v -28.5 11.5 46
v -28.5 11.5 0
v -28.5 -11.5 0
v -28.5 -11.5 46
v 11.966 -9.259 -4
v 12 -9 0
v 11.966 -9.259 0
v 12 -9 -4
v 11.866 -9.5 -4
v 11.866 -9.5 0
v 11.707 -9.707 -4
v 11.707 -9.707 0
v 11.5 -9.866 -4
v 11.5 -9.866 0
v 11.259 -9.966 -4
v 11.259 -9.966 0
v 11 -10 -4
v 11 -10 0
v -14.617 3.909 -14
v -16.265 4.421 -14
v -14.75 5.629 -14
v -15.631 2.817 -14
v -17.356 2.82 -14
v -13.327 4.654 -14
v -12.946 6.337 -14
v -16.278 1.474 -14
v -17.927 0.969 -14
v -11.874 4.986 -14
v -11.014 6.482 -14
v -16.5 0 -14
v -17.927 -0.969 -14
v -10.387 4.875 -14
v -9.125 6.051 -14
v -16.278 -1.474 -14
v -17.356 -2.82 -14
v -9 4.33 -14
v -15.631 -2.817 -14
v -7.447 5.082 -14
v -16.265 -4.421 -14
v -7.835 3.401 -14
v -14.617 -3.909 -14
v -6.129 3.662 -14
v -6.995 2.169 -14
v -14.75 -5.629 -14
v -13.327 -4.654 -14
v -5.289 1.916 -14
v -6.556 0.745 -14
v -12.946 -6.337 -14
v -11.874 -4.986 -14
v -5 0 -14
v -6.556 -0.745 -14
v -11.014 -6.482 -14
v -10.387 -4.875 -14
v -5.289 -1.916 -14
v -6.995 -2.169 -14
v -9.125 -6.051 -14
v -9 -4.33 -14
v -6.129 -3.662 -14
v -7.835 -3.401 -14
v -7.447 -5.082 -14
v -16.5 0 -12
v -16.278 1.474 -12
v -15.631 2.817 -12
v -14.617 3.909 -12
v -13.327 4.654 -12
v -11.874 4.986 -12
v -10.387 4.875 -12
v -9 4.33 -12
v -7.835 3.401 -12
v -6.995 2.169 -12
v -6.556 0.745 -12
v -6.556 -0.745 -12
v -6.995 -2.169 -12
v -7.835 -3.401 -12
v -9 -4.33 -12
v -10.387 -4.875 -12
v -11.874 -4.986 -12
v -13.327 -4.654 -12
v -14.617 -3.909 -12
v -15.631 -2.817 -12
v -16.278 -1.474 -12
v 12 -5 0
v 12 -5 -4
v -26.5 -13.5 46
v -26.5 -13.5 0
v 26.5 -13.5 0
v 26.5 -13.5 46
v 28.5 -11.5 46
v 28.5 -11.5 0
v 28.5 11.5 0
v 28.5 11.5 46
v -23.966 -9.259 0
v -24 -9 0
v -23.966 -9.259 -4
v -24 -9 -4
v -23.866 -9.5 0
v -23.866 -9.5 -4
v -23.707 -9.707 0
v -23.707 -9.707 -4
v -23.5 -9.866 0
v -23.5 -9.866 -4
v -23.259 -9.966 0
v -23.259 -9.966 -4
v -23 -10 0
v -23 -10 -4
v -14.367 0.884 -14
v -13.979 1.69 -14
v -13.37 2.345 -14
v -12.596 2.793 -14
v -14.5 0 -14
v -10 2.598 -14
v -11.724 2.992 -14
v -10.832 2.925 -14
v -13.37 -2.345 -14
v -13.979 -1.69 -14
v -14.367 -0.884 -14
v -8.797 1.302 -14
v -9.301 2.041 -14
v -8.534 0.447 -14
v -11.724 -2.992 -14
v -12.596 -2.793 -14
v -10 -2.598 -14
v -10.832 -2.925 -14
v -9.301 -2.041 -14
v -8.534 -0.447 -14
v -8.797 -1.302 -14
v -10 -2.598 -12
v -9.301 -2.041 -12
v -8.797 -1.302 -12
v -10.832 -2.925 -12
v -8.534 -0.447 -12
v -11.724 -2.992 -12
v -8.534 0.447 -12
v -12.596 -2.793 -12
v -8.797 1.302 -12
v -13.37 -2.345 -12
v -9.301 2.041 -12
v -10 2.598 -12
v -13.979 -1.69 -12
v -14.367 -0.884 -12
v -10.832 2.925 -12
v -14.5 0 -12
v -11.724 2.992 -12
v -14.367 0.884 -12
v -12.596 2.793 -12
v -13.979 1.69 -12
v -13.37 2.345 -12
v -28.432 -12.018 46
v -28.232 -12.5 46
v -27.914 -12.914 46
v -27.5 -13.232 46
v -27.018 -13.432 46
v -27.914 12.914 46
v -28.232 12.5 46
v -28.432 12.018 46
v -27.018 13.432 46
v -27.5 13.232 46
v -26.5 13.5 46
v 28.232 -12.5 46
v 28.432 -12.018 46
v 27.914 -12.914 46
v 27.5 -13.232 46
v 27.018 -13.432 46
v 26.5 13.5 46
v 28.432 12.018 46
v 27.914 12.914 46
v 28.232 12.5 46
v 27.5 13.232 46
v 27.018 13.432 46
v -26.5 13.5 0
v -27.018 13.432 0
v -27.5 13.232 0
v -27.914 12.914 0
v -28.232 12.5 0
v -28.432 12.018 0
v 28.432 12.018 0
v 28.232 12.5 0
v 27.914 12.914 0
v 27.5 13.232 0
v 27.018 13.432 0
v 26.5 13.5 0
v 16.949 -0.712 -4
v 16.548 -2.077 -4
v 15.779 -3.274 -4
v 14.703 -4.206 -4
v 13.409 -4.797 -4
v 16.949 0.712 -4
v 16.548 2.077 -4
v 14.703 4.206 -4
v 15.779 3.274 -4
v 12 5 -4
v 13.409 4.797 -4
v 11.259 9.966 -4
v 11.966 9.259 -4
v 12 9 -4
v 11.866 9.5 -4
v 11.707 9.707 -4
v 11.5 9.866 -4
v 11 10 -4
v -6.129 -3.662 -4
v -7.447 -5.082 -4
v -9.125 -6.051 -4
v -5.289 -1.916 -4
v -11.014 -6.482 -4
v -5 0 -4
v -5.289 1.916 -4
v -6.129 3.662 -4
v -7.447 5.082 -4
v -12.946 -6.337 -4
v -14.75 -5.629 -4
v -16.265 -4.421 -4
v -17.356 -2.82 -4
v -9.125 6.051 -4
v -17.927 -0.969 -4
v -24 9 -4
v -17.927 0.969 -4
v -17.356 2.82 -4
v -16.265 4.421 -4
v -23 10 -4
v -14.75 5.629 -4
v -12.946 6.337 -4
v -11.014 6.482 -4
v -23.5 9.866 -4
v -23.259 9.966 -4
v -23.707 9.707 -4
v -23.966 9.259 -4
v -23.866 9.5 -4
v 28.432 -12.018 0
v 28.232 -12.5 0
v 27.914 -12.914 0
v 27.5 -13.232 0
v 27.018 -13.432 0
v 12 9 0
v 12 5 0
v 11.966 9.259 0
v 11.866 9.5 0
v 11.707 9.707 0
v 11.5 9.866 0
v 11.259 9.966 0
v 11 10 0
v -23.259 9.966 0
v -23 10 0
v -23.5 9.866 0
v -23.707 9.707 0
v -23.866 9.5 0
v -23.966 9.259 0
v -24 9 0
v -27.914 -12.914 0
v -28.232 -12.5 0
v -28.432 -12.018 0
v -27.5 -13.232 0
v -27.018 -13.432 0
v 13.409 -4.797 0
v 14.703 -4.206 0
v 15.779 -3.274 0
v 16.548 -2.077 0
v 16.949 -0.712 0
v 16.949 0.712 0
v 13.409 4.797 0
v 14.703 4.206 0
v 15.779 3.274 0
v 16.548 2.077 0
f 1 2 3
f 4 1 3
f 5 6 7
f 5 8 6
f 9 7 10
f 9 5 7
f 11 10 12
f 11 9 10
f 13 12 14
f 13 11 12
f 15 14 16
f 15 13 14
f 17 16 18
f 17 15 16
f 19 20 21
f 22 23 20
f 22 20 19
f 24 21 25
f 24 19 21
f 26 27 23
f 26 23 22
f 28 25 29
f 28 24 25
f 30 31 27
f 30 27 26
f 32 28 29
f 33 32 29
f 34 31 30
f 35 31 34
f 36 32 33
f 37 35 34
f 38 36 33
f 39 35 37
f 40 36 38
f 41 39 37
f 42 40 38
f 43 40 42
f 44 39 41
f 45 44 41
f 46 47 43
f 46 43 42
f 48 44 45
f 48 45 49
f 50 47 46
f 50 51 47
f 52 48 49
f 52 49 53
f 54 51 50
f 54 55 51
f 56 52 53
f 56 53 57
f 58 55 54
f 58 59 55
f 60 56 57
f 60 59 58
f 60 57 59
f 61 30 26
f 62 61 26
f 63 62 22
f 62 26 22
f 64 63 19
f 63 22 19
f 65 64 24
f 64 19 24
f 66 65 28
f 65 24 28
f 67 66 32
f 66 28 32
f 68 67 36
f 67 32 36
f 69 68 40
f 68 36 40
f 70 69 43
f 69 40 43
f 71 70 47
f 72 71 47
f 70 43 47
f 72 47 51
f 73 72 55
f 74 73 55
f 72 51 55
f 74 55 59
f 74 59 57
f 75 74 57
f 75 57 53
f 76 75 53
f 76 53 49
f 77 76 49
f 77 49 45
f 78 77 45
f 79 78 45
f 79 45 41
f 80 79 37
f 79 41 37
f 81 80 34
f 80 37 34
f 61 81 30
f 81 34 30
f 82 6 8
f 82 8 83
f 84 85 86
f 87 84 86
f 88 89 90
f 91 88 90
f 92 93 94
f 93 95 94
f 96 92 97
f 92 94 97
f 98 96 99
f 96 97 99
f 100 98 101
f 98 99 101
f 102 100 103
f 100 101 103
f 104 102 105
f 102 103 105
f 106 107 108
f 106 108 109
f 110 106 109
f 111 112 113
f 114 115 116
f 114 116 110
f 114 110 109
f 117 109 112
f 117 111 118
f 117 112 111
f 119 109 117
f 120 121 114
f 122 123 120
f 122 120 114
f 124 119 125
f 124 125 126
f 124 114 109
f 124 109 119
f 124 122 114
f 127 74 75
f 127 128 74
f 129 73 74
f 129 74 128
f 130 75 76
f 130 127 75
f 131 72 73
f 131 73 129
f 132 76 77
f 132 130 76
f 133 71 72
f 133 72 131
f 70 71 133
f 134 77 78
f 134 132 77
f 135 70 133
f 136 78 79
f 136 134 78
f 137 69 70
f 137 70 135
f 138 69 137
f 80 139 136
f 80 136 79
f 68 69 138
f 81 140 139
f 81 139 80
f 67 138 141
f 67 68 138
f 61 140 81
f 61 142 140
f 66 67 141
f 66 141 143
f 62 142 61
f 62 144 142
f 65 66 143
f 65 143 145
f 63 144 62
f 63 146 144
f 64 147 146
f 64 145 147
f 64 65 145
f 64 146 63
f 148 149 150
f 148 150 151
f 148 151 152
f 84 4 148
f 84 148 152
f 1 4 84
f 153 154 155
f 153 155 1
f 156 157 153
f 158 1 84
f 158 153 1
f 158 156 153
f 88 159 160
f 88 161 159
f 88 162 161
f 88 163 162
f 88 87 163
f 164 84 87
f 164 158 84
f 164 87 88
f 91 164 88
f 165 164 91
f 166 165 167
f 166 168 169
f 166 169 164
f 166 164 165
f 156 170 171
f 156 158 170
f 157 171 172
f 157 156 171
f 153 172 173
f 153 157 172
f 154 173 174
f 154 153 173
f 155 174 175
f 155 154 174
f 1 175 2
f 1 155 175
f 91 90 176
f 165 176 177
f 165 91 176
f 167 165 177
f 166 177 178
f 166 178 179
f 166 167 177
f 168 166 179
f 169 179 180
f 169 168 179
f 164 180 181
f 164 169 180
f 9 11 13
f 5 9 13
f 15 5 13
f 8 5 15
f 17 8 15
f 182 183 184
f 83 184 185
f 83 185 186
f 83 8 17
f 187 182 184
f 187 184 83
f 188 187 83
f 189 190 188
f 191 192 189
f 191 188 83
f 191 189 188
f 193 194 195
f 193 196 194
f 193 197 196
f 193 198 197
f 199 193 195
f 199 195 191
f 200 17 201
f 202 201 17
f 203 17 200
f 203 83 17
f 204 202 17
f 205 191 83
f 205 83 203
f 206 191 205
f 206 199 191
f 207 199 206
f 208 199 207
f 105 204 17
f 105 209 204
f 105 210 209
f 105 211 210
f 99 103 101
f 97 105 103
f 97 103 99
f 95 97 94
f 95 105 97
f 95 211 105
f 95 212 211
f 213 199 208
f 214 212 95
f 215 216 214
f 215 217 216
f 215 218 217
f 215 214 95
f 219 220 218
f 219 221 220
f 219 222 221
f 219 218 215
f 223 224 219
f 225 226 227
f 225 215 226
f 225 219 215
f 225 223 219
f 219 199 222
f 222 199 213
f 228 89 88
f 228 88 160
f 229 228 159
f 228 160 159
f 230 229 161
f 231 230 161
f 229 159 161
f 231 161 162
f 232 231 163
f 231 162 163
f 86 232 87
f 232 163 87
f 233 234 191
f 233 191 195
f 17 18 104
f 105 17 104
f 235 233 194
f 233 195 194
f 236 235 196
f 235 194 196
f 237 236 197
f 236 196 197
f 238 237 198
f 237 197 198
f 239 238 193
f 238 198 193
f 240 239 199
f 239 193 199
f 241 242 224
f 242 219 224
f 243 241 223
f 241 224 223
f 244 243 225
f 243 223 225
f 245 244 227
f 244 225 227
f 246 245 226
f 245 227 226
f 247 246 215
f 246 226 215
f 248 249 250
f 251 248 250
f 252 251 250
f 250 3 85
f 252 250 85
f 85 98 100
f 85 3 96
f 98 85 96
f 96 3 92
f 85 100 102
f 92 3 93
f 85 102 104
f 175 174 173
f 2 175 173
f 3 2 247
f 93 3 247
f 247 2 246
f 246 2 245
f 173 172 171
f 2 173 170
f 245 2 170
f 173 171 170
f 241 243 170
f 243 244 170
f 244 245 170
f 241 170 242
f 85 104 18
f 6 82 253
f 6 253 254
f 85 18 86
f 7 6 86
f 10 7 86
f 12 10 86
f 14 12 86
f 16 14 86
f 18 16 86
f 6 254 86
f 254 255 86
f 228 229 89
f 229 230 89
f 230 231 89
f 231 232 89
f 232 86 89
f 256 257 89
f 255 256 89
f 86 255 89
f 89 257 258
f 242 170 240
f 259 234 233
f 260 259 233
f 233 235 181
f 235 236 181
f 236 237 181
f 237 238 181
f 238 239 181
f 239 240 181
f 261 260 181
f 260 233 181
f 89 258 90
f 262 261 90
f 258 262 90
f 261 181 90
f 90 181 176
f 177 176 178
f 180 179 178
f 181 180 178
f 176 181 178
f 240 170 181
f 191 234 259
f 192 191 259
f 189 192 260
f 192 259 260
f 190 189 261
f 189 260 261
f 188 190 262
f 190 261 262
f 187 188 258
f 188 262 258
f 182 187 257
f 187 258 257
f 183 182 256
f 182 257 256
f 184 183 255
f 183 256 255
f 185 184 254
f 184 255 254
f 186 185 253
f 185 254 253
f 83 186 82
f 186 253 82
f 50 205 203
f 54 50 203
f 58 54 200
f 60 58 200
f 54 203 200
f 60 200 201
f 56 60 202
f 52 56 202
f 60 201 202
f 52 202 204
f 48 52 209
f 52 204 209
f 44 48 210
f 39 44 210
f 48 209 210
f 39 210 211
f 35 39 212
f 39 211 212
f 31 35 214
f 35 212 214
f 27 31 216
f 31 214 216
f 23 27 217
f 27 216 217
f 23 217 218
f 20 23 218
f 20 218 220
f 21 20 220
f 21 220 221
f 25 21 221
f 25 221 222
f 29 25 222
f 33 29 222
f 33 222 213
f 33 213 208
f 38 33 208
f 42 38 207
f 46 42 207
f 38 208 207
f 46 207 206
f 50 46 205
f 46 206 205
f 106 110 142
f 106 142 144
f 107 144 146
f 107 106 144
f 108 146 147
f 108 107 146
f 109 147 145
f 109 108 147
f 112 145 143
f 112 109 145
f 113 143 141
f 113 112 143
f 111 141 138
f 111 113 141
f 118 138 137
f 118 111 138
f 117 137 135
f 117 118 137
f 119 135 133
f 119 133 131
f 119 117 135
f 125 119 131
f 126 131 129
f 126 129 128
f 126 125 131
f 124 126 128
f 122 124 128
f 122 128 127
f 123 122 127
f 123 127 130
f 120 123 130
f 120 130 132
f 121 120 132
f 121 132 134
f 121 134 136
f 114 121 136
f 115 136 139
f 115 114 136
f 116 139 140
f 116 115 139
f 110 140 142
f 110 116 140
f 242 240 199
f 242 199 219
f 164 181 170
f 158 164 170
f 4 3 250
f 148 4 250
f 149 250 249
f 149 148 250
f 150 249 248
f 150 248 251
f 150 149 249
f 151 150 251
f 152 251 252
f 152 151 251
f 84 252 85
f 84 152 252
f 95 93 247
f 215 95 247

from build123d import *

# Parameters (mm, degrees)
BOSS_EXTRU_1_DEPTH      = 46
CONG_1_R                = 2
ESQUISSE2_W             = 36
ESQUISSE2_H             = 20
BOSS_EXTRU_2_DEPTH      = 4
CONG_3_R                = 1
ESQUISSE4_R             = 6.5
BOSS_EXTRU_3_DEPTH      = 10
ESQUISSE5_R             = 5
ESQUISSE5_R_2           = 3
ENL_V_MAT_EXTRU_1_DEPTH = 2
BOSS_EXTRU_4_DEPTH      = 4


with BuildPart() as part:
    # Esquisse1 → Boss.-Extru.1 (new body)
    with BuildSketch(Plane.XY):
        Polygon((0, -13.5), (28.5, -13.5), (28.5, 13.5), (-28.5, 13.5), (-28.5, -13.5), align=None)
    extrude(amount=BOSS_EXTRU_1_DEPTH)

    # Congé1
    cong_1_edges = [part.edges().sort_by_distance(p)[0] for p in [
        (-28.5, -13.5, 23),
        (-28.5, 13.5, 23),
        (28.5, 13.5, 23),
        (28.5, -13.5, 23),
    ]]
    fillet(cong_1_edges, radius=CONG_1_R)

    # Esquisse2 → Boss.-Extru.2 (add)
    with BuildSketch(Plane(origin=(0, 0, 0), x_dir=(-1, 0, 0), z_dir=(0, 0, -1))):
        with Locations((6, 0)):
            Rectangle(ESQUISSE2_W, ESQUISSE2_H)
    extrude(amount=BOSS_EXTRU_2_DEPTH)

    # Congé3
    cong_3_edges = [part.edges().sort_by_distance(p)[0] for p in [
        (-24, 10, -2),
        (12, 10, -2),
        (12, -10, -2),
        (-24, -10, -2),
    ]]
    fillet(cong_3_edges, radius=CONG_3_R)

    # Esquisse4 → Boss.-Extru.3 (add)
    with BuildSketch(Plane(origin=(0, 0, -4), x_dir=(-1, 0, 0), z_dir=(0, 0, -1))):
        with Locations(Location((11.5, 0, 0), (0, 0, 180))):
            Circle(ESQUISSE4_R)
    extrude(amount=BOSS_EXTRU_3_DEPTH)

    # Esquisse5 → Enlèv. mat.-Extru.1 (cut)
    with BuildSketch(Plane(origin=(0, 0, -14), x_dir=(-1, 0, 0), z_dir=(0, 0, -1))):
        with Locations((11.5, 0)):
            Circle(ESQUISSE5_R)
        with Locations((11.5, 0)):
            Circle(ESQUISSE5_R_2, mode=Mode.SUBTRACT)
    extrude(amount=-ENL_V_MAT_EXTRU_1_DEPTH, mode=Mode.SUBTRACT)

    # Esquisse7 → Boss.-Extru.4 (add)
    with BuildSketch(Plane(origin=(0, 0, 0), x_dir=(-1, 0, 0), z_dir=(0, 0, -1))):
        with BuildLine():
            Line((-12, -5), (-12, 0))
            Line((-12, 0), (-12, 5))
            ThreePointArc((-12, 5), (-17, 0), (-12, -5))
        make_face()
    extrude(amount=BOSS_EXTRU_4_DEPTH)


solid = part.part
